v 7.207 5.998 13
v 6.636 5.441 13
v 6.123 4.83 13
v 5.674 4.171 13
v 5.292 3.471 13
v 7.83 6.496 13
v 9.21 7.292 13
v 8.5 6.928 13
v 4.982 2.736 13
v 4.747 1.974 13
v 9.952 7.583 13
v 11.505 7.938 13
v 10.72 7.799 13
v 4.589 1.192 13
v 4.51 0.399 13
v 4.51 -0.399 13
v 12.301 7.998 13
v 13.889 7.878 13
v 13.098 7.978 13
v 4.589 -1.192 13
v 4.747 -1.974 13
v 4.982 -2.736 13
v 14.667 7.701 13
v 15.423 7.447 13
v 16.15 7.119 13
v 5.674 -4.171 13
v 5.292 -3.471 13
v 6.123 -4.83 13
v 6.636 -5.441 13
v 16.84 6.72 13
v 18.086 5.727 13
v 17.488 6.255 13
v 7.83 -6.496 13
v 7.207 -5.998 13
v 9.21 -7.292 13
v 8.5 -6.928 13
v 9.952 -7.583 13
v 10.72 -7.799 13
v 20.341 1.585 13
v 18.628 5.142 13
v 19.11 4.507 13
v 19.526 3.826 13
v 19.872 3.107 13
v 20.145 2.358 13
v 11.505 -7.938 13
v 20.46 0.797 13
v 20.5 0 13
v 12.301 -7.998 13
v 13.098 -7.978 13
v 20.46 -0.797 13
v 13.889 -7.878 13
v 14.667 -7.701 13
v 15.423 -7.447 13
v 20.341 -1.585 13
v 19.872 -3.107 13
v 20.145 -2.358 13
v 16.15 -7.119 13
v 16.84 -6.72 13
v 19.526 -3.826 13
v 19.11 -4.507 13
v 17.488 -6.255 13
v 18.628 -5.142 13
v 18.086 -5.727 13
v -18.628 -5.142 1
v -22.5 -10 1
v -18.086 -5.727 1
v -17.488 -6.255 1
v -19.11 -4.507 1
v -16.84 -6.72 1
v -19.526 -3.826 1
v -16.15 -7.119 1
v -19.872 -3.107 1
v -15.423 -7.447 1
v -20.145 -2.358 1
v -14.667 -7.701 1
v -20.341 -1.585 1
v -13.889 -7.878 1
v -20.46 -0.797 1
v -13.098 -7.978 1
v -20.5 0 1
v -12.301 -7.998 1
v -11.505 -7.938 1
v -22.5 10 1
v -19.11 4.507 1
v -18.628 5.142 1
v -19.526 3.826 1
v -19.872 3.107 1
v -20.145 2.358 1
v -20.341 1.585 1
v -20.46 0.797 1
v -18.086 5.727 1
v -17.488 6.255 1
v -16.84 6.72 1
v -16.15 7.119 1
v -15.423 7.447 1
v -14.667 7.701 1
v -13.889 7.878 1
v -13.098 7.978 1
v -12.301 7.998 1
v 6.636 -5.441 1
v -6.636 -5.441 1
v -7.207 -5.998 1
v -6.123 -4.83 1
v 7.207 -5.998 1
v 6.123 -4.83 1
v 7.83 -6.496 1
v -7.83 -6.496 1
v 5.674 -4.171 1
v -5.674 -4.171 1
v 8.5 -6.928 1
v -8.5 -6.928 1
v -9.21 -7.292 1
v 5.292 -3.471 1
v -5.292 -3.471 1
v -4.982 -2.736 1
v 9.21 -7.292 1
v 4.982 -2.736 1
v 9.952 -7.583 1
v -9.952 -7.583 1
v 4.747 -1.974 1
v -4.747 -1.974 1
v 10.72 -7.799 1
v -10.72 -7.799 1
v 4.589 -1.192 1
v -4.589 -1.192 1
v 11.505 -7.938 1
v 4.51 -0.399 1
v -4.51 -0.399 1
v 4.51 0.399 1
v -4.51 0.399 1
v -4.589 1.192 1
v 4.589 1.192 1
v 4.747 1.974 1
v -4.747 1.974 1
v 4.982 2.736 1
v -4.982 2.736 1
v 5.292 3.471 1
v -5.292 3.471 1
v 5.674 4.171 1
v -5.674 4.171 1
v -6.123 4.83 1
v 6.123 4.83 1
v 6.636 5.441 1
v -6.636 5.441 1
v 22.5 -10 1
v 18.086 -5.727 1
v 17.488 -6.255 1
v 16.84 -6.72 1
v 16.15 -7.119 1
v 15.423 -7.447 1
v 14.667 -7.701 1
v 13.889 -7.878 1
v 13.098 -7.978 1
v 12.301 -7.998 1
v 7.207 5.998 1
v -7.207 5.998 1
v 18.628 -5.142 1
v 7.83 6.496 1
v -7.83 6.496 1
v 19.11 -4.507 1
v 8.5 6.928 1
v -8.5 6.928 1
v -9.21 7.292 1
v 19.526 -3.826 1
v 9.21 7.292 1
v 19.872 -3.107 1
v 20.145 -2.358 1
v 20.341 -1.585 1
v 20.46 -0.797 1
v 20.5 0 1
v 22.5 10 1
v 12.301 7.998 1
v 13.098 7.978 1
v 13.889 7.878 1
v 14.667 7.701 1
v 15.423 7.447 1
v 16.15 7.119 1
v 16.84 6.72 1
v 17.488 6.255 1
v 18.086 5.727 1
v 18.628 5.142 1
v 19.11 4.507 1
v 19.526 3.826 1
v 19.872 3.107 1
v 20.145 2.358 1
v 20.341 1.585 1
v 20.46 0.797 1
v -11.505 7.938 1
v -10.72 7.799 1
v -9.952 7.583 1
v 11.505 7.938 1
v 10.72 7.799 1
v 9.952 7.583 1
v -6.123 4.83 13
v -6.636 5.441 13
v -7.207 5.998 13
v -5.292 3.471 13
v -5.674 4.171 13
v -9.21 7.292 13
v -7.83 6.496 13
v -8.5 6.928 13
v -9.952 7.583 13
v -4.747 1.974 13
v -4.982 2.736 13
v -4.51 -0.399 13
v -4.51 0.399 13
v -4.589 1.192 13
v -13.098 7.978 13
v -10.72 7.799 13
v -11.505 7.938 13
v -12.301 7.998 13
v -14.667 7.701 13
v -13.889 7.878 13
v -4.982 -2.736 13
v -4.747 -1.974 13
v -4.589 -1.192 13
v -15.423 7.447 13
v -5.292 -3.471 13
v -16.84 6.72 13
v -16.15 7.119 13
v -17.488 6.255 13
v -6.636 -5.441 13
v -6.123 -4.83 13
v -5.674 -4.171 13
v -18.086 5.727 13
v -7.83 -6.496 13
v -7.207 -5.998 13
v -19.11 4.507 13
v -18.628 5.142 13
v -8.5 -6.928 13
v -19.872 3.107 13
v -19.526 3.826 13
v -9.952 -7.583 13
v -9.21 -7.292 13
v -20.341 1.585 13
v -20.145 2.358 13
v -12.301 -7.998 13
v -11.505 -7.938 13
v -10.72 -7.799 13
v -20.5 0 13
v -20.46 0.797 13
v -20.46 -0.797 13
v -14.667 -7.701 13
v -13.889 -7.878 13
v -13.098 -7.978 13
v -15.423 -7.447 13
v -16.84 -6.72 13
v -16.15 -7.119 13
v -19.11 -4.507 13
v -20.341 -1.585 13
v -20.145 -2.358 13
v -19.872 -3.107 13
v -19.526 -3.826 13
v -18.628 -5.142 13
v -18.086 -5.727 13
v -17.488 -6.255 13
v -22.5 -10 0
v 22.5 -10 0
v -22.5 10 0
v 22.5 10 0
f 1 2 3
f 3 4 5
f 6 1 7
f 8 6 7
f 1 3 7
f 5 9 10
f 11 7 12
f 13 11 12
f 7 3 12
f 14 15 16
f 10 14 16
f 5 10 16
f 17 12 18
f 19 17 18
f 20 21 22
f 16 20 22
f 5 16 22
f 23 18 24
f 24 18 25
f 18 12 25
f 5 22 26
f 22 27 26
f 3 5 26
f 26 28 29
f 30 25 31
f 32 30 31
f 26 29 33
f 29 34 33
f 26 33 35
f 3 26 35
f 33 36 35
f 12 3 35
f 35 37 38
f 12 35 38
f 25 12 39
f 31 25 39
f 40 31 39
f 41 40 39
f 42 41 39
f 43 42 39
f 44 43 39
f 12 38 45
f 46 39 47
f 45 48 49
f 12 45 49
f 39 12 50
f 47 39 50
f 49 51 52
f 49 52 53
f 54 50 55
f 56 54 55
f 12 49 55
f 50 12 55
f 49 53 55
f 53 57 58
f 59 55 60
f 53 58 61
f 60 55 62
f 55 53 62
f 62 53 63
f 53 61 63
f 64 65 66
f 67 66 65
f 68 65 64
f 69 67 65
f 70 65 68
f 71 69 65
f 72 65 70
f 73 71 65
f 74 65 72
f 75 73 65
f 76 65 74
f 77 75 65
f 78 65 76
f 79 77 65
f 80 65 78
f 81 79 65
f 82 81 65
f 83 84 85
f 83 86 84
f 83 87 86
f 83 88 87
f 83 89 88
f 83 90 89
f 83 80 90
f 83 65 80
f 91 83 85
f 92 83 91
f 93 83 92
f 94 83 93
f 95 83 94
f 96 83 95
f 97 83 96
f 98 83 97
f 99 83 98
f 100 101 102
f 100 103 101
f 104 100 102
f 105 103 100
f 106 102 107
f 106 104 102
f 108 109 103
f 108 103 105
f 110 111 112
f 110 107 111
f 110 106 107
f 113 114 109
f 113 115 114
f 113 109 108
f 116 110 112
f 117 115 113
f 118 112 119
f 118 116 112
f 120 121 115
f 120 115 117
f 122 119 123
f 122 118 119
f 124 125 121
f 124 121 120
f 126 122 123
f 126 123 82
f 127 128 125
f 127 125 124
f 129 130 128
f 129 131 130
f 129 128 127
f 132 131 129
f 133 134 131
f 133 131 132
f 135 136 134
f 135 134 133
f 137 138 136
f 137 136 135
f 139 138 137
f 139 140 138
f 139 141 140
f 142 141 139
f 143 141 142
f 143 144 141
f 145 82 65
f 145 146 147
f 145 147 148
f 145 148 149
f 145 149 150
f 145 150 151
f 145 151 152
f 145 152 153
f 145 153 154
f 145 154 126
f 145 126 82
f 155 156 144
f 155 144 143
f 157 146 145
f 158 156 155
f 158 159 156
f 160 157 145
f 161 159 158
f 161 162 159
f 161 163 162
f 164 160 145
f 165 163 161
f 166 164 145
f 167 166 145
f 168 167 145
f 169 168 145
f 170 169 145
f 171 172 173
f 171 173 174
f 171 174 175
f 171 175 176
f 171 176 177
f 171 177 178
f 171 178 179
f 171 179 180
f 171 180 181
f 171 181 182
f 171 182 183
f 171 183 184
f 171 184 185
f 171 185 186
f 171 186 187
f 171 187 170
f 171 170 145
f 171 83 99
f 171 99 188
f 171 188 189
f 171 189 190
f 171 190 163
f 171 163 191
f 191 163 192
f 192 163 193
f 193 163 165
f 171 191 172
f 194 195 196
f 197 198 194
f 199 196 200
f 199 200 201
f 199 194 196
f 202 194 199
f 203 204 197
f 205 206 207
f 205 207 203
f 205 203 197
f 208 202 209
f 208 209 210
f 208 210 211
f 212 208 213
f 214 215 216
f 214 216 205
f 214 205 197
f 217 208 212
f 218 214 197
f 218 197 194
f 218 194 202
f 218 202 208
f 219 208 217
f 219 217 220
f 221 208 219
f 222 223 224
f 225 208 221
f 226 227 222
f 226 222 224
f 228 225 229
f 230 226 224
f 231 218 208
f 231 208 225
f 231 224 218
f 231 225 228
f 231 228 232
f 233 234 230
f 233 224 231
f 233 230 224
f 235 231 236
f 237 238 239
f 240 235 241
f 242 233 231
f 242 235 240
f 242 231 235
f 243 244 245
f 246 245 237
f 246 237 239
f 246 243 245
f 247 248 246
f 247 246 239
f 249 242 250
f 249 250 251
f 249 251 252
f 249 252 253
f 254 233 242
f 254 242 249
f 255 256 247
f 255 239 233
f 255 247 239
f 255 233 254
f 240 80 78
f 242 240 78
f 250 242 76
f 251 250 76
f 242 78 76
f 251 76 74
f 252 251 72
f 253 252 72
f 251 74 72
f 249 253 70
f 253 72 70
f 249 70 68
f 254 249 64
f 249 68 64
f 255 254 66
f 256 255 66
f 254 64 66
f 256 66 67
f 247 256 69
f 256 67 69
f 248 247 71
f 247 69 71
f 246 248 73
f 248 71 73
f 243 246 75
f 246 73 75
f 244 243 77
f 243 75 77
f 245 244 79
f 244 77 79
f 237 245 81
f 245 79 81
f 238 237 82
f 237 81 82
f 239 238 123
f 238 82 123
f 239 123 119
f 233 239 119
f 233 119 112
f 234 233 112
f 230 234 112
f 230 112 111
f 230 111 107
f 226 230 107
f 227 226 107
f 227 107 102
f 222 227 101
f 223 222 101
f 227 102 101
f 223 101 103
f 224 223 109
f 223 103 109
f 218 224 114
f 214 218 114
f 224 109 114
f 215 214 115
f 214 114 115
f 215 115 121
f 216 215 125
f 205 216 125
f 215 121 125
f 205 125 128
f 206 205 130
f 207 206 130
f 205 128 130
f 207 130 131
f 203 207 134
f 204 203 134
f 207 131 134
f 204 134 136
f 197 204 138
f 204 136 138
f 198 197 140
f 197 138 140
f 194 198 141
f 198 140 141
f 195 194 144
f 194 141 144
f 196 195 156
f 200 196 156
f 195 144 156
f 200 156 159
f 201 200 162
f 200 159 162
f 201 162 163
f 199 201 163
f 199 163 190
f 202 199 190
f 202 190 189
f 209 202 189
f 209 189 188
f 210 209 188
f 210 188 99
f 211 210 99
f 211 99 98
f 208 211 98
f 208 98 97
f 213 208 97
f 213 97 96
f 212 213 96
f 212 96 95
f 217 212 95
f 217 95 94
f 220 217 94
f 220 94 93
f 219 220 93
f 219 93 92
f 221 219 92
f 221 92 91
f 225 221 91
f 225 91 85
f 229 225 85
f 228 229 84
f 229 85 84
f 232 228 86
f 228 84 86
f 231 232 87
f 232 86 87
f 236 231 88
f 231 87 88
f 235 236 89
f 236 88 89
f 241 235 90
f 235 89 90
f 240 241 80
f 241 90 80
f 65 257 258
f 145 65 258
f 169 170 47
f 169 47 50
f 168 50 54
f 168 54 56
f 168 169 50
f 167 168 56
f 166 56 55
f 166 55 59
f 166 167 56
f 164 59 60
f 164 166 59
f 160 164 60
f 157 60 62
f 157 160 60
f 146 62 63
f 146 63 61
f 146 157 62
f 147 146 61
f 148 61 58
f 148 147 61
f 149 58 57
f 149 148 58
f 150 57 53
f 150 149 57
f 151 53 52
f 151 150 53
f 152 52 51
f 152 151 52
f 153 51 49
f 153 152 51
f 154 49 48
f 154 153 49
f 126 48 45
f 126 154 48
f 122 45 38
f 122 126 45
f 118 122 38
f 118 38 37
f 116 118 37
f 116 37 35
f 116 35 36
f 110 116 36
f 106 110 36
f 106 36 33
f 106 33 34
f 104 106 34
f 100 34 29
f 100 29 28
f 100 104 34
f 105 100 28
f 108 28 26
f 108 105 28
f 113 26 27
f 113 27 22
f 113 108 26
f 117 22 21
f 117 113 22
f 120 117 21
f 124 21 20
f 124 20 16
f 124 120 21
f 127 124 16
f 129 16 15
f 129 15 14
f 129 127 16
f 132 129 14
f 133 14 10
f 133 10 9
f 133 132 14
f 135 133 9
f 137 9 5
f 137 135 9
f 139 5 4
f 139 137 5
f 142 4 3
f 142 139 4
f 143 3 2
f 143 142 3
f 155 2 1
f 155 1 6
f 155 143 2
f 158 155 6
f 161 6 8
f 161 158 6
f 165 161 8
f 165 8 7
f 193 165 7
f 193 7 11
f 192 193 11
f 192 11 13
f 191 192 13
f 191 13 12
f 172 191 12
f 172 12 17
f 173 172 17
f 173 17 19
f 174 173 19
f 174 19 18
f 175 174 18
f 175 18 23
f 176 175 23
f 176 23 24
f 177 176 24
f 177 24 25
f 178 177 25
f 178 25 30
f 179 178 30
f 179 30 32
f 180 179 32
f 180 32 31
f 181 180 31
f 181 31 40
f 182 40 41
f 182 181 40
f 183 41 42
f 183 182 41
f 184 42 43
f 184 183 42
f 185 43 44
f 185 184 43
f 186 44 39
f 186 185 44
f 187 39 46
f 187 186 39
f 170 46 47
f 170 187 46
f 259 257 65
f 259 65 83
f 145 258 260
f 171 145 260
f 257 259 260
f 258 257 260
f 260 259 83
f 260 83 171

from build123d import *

# Parameters (mm, degrees)
SKETCH1_W           = 45
SKETCH1_H           = 20
BOSS_EXTRUDE1_DEPTH = 1
SKETCH2_R           = 8
BOSS_EXTRUDE2_DEPTH = 12


with BuildPart() as part:
    # Sketch1 → Boss-Extrude1 (new body)
    with BuildSketch(Plane.XY):
        Rectangle(SKETCH1_W, SKETCH1_H)
    extrude(amount=BOSS_EXTRUDE1_DEPTH)

    # Sketch2 → Boss-Extrude2 (add)
    with BuildSketch(Plane.XY.offset(1)):
        with Locations(Location((-12.5, 0, 0), (0, 0, 180))):
            Circle(SKETCH2_R)
    boss_extrude2 = extrude(amount=BOSS_EXTRUDE2_DEPTH)

    # Mirror1: Boss-Extrude2 across plane
    add(boss_extrude2.mirror(Plane(origin=(0, 0, 0), x_dir=(0, 0, 1), z_dir=(1, 0, 0))))


solid = part.part
